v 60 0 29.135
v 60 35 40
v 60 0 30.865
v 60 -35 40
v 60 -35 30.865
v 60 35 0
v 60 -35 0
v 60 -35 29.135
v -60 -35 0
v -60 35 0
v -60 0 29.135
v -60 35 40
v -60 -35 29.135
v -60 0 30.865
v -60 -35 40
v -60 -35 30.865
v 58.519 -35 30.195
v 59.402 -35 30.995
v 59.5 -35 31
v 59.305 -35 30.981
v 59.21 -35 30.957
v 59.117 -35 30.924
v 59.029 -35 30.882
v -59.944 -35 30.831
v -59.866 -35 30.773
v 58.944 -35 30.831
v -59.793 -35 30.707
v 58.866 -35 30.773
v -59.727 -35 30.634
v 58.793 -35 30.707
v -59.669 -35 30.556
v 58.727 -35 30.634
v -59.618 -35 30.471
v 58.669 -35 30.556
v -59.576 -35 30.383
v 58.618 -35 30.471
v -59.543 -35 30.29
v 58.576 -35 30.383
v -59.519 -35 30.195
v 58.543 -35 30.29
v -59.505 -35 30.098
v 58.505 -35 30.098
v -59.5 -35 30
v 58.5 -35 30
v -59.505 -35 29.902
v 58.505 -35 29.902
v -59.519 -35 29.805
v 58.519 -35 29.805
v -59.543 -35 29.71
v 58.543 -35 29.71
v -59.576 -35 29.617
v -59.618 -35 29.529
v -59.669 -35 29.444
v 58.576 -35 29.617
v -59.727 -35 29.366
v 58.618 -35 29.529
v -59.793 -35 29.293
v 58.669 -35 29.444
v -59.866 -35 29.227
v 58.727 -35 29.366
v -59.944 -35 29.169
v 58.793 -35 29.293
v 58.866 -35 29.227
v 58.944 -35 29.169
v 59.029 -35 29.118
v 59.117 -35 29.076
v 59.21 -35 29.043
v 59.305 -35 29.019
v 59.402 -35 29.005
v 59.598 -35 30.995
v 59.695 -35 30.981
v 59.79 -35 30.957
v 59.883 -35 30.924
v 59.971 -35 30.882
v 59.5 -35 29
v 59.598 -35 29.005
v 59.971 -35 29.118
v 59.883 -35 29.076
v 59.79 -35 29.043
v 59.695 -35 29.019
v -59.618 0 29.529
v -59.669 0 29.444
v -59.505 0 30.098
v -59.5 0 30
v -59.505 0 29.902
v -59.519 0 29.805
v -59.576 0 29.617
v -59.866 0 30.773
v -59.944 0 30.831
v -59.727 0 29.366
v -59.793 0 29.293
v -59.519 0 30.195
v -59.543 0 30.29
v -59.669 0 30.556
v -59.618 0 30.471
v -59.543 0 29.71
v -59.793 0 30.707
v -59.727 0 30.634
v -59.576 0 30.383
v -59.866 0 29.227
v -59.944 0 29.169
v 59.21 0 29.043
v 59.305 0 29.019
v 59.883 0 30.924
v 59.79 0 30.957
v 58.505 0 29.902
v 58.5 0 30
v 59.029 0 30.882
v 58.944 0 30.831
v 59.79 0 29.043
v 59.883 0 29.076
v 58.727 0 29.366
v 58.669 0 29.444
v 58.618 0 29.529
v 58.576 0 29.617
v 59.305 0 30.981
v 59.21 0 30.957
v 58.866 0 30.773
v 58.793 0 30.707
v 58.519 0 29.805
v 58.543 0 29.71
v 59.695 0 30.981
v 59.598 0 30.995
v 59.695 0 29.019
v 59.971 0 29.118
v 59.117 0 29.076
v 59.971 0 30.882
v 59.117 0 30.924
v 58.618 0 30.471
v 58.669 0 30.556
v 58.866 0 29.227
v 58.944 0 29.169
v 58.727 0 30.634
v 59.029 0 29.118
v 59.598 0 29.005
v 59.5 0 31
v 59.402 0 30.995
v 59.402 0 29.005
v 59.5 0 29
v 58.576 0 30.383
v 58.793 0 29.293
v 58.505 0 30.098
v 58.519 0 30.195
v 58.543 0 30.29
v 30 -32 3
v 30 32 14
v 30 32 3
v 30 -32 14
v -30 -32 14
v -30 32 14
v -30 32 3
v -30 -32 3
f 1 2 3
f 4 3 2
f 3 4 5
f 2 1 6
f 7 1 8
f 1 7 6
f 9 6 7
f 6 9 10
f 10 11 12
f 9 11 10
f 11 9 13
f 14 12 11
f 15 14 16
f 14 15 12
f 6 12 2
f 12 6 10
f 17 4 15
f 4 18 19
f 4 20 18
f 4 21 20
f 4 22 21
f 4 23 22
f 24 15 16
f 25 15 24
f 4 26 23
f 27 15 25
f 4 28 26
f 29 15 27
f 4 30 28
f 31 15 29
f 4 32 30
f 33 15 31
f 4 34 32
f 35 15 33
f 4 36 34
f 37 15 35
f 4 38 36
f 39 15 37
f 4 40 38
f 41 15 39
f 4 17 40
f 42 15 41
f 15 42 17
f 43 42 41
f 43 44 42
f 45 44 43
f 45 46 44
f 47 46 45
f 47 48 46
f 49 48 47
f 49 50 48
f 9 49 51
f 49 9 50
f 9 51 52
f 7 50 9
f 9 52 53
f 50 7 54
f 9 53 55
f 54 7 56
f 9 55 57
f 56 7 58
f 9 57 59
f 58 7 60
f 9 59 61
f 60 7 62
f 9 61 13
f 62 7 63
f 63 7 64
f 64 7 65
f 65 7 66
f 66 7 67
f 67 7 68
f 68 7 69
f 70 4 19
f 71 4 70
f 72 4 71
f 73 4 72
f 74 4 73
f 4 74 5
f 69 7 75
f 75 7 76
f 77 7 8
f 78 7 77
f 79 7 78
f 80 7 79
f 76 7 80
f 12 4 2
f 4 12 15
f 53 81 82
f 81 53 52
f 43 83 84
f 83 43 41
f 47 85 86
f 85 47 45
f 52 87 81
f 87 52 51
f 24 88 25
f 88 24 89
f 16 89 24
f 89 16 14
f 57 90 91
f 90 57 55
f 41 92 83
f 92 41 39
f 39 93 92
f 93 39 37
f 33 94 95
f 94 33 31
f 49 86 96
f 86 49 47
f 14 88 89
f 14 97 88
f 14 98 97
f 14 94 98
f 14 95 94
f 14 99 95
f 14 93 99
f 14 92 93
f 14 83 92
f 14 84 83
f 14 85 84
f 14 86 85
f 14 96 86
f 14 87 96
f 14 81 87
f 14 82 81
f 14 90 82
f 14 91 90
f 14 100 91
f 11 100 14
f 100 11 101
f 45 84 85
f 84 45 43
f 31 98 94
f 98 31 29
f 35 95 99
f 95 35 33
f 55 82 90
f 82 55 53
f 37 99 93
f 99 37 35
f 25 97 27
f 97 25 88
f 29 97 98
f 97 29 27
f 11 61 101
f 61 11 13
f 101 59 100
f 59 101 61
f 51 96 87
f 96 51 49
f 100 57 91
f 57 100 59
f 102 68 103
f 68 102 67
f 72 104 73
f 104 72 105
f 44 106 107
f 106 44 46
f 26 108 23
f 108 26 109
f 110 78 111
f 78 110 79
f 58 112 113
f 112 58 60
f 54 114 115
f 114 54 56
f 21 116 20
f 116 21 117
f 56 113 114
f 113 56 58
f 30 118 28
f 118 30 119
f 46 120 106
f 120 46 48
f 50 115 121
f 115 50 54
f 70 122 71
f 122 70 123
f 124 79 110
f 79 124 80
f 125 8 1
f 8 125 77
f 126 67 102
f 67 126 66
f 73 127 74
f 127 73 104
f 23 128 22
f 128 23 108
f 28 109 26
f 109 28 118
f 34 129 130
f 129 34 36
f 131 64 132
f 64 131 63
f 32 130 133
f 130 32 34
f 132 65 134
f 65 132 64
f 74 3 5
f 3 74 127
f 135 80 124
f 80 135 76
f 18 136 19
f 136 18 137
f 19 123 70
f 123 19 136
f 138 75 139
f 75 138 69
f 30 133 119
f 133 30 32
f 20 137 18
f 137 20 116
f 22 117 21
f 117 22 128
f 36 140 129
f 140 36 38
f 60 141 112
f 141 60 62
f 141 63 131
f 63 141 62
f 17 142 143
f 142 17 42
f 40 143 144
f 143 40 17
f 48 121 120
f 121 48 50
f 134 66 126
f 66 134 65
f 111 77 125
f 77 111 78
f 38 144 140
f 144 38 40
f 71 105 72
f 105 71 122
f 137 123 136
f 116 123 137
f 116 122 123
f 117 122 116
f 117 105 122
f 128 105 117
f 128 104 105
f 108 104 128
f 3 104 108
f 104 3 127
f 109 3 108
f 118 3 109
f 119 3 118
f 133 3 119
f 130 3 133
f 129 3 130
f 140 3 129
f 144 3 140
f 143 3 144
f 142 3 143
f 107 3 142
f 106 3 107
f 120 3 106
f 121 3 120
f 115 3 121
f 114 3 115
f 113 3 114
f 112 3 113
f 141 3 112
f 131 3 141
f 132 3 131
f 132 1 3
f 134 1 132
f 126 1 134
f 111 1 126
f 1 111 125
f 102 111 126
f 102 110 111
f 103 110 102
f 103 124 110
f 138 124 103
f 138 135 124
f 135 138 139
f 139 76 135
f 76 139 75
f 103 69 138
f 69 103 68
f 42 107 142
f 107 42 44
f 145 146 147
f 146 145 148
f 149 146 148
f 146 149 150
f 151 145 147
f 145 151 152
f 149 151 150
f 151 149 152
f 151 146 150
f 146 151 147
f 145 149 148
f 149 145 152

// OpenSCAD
// Mini horizontal gel-electrophoresis box - buffer tank
// Print orientation: base on XY plane, open top facing +Z

// ---- Tank dimensions ----
outer_x = 120;   // outer length in X
outer_y = 70;    // outer width in Y
height  = 40;    // overall height in Z
wall    = 3;     // wall thickness
floor   = 3;     // floor thickness (bottom solid)

// ---- Platform dimensions ----
plat_len   = 60;  // platform length in X (centred)
plat_wid   = outer_y - 2*wall; // platform spans full inner width
plat_top_z = 13;  // top of platform (floor 3 + 10 mm rise)

// ---- Wire holes ----
hole_d     = 2;   // electrode wire hole diameter
hole_y     = 0;   // hole Y position
hole_z     = 30;  // hole Z position
eps        = 0.5; // cutter overshoot past end walls

$fn = 64;

difference() {
    // Main tank body
    union() {
        // Floor slab
        translate([-outer_x/2, -outer_y/2, 0])
            cube([outer_x, outer_y, floor]);
        // Walls above floor (hollow)
        translate([-outer_x/2, -outer_y/2, floor])
            cube([outer_x, outer_y, height - floor]);
    }

    // Raised platform for gel tray
    translate([-plat_len/2, -plat_wid/2, floor])
        cube([plat_len, plat_wid, plat_top_z - floor + 1]); // overlaps floor for clean union

    // Electrode wire holes through end walls along X
    for (side = [-1, 1])
        translate([side > 0 ? outer_x/2 - eps : -outer_x/2 - eps, hole_y, hole_z])
            rotate([90, 0, 0])
                cylinder(d = hole_d, h = outer_x + 2*eps, $fn = 64);
}
